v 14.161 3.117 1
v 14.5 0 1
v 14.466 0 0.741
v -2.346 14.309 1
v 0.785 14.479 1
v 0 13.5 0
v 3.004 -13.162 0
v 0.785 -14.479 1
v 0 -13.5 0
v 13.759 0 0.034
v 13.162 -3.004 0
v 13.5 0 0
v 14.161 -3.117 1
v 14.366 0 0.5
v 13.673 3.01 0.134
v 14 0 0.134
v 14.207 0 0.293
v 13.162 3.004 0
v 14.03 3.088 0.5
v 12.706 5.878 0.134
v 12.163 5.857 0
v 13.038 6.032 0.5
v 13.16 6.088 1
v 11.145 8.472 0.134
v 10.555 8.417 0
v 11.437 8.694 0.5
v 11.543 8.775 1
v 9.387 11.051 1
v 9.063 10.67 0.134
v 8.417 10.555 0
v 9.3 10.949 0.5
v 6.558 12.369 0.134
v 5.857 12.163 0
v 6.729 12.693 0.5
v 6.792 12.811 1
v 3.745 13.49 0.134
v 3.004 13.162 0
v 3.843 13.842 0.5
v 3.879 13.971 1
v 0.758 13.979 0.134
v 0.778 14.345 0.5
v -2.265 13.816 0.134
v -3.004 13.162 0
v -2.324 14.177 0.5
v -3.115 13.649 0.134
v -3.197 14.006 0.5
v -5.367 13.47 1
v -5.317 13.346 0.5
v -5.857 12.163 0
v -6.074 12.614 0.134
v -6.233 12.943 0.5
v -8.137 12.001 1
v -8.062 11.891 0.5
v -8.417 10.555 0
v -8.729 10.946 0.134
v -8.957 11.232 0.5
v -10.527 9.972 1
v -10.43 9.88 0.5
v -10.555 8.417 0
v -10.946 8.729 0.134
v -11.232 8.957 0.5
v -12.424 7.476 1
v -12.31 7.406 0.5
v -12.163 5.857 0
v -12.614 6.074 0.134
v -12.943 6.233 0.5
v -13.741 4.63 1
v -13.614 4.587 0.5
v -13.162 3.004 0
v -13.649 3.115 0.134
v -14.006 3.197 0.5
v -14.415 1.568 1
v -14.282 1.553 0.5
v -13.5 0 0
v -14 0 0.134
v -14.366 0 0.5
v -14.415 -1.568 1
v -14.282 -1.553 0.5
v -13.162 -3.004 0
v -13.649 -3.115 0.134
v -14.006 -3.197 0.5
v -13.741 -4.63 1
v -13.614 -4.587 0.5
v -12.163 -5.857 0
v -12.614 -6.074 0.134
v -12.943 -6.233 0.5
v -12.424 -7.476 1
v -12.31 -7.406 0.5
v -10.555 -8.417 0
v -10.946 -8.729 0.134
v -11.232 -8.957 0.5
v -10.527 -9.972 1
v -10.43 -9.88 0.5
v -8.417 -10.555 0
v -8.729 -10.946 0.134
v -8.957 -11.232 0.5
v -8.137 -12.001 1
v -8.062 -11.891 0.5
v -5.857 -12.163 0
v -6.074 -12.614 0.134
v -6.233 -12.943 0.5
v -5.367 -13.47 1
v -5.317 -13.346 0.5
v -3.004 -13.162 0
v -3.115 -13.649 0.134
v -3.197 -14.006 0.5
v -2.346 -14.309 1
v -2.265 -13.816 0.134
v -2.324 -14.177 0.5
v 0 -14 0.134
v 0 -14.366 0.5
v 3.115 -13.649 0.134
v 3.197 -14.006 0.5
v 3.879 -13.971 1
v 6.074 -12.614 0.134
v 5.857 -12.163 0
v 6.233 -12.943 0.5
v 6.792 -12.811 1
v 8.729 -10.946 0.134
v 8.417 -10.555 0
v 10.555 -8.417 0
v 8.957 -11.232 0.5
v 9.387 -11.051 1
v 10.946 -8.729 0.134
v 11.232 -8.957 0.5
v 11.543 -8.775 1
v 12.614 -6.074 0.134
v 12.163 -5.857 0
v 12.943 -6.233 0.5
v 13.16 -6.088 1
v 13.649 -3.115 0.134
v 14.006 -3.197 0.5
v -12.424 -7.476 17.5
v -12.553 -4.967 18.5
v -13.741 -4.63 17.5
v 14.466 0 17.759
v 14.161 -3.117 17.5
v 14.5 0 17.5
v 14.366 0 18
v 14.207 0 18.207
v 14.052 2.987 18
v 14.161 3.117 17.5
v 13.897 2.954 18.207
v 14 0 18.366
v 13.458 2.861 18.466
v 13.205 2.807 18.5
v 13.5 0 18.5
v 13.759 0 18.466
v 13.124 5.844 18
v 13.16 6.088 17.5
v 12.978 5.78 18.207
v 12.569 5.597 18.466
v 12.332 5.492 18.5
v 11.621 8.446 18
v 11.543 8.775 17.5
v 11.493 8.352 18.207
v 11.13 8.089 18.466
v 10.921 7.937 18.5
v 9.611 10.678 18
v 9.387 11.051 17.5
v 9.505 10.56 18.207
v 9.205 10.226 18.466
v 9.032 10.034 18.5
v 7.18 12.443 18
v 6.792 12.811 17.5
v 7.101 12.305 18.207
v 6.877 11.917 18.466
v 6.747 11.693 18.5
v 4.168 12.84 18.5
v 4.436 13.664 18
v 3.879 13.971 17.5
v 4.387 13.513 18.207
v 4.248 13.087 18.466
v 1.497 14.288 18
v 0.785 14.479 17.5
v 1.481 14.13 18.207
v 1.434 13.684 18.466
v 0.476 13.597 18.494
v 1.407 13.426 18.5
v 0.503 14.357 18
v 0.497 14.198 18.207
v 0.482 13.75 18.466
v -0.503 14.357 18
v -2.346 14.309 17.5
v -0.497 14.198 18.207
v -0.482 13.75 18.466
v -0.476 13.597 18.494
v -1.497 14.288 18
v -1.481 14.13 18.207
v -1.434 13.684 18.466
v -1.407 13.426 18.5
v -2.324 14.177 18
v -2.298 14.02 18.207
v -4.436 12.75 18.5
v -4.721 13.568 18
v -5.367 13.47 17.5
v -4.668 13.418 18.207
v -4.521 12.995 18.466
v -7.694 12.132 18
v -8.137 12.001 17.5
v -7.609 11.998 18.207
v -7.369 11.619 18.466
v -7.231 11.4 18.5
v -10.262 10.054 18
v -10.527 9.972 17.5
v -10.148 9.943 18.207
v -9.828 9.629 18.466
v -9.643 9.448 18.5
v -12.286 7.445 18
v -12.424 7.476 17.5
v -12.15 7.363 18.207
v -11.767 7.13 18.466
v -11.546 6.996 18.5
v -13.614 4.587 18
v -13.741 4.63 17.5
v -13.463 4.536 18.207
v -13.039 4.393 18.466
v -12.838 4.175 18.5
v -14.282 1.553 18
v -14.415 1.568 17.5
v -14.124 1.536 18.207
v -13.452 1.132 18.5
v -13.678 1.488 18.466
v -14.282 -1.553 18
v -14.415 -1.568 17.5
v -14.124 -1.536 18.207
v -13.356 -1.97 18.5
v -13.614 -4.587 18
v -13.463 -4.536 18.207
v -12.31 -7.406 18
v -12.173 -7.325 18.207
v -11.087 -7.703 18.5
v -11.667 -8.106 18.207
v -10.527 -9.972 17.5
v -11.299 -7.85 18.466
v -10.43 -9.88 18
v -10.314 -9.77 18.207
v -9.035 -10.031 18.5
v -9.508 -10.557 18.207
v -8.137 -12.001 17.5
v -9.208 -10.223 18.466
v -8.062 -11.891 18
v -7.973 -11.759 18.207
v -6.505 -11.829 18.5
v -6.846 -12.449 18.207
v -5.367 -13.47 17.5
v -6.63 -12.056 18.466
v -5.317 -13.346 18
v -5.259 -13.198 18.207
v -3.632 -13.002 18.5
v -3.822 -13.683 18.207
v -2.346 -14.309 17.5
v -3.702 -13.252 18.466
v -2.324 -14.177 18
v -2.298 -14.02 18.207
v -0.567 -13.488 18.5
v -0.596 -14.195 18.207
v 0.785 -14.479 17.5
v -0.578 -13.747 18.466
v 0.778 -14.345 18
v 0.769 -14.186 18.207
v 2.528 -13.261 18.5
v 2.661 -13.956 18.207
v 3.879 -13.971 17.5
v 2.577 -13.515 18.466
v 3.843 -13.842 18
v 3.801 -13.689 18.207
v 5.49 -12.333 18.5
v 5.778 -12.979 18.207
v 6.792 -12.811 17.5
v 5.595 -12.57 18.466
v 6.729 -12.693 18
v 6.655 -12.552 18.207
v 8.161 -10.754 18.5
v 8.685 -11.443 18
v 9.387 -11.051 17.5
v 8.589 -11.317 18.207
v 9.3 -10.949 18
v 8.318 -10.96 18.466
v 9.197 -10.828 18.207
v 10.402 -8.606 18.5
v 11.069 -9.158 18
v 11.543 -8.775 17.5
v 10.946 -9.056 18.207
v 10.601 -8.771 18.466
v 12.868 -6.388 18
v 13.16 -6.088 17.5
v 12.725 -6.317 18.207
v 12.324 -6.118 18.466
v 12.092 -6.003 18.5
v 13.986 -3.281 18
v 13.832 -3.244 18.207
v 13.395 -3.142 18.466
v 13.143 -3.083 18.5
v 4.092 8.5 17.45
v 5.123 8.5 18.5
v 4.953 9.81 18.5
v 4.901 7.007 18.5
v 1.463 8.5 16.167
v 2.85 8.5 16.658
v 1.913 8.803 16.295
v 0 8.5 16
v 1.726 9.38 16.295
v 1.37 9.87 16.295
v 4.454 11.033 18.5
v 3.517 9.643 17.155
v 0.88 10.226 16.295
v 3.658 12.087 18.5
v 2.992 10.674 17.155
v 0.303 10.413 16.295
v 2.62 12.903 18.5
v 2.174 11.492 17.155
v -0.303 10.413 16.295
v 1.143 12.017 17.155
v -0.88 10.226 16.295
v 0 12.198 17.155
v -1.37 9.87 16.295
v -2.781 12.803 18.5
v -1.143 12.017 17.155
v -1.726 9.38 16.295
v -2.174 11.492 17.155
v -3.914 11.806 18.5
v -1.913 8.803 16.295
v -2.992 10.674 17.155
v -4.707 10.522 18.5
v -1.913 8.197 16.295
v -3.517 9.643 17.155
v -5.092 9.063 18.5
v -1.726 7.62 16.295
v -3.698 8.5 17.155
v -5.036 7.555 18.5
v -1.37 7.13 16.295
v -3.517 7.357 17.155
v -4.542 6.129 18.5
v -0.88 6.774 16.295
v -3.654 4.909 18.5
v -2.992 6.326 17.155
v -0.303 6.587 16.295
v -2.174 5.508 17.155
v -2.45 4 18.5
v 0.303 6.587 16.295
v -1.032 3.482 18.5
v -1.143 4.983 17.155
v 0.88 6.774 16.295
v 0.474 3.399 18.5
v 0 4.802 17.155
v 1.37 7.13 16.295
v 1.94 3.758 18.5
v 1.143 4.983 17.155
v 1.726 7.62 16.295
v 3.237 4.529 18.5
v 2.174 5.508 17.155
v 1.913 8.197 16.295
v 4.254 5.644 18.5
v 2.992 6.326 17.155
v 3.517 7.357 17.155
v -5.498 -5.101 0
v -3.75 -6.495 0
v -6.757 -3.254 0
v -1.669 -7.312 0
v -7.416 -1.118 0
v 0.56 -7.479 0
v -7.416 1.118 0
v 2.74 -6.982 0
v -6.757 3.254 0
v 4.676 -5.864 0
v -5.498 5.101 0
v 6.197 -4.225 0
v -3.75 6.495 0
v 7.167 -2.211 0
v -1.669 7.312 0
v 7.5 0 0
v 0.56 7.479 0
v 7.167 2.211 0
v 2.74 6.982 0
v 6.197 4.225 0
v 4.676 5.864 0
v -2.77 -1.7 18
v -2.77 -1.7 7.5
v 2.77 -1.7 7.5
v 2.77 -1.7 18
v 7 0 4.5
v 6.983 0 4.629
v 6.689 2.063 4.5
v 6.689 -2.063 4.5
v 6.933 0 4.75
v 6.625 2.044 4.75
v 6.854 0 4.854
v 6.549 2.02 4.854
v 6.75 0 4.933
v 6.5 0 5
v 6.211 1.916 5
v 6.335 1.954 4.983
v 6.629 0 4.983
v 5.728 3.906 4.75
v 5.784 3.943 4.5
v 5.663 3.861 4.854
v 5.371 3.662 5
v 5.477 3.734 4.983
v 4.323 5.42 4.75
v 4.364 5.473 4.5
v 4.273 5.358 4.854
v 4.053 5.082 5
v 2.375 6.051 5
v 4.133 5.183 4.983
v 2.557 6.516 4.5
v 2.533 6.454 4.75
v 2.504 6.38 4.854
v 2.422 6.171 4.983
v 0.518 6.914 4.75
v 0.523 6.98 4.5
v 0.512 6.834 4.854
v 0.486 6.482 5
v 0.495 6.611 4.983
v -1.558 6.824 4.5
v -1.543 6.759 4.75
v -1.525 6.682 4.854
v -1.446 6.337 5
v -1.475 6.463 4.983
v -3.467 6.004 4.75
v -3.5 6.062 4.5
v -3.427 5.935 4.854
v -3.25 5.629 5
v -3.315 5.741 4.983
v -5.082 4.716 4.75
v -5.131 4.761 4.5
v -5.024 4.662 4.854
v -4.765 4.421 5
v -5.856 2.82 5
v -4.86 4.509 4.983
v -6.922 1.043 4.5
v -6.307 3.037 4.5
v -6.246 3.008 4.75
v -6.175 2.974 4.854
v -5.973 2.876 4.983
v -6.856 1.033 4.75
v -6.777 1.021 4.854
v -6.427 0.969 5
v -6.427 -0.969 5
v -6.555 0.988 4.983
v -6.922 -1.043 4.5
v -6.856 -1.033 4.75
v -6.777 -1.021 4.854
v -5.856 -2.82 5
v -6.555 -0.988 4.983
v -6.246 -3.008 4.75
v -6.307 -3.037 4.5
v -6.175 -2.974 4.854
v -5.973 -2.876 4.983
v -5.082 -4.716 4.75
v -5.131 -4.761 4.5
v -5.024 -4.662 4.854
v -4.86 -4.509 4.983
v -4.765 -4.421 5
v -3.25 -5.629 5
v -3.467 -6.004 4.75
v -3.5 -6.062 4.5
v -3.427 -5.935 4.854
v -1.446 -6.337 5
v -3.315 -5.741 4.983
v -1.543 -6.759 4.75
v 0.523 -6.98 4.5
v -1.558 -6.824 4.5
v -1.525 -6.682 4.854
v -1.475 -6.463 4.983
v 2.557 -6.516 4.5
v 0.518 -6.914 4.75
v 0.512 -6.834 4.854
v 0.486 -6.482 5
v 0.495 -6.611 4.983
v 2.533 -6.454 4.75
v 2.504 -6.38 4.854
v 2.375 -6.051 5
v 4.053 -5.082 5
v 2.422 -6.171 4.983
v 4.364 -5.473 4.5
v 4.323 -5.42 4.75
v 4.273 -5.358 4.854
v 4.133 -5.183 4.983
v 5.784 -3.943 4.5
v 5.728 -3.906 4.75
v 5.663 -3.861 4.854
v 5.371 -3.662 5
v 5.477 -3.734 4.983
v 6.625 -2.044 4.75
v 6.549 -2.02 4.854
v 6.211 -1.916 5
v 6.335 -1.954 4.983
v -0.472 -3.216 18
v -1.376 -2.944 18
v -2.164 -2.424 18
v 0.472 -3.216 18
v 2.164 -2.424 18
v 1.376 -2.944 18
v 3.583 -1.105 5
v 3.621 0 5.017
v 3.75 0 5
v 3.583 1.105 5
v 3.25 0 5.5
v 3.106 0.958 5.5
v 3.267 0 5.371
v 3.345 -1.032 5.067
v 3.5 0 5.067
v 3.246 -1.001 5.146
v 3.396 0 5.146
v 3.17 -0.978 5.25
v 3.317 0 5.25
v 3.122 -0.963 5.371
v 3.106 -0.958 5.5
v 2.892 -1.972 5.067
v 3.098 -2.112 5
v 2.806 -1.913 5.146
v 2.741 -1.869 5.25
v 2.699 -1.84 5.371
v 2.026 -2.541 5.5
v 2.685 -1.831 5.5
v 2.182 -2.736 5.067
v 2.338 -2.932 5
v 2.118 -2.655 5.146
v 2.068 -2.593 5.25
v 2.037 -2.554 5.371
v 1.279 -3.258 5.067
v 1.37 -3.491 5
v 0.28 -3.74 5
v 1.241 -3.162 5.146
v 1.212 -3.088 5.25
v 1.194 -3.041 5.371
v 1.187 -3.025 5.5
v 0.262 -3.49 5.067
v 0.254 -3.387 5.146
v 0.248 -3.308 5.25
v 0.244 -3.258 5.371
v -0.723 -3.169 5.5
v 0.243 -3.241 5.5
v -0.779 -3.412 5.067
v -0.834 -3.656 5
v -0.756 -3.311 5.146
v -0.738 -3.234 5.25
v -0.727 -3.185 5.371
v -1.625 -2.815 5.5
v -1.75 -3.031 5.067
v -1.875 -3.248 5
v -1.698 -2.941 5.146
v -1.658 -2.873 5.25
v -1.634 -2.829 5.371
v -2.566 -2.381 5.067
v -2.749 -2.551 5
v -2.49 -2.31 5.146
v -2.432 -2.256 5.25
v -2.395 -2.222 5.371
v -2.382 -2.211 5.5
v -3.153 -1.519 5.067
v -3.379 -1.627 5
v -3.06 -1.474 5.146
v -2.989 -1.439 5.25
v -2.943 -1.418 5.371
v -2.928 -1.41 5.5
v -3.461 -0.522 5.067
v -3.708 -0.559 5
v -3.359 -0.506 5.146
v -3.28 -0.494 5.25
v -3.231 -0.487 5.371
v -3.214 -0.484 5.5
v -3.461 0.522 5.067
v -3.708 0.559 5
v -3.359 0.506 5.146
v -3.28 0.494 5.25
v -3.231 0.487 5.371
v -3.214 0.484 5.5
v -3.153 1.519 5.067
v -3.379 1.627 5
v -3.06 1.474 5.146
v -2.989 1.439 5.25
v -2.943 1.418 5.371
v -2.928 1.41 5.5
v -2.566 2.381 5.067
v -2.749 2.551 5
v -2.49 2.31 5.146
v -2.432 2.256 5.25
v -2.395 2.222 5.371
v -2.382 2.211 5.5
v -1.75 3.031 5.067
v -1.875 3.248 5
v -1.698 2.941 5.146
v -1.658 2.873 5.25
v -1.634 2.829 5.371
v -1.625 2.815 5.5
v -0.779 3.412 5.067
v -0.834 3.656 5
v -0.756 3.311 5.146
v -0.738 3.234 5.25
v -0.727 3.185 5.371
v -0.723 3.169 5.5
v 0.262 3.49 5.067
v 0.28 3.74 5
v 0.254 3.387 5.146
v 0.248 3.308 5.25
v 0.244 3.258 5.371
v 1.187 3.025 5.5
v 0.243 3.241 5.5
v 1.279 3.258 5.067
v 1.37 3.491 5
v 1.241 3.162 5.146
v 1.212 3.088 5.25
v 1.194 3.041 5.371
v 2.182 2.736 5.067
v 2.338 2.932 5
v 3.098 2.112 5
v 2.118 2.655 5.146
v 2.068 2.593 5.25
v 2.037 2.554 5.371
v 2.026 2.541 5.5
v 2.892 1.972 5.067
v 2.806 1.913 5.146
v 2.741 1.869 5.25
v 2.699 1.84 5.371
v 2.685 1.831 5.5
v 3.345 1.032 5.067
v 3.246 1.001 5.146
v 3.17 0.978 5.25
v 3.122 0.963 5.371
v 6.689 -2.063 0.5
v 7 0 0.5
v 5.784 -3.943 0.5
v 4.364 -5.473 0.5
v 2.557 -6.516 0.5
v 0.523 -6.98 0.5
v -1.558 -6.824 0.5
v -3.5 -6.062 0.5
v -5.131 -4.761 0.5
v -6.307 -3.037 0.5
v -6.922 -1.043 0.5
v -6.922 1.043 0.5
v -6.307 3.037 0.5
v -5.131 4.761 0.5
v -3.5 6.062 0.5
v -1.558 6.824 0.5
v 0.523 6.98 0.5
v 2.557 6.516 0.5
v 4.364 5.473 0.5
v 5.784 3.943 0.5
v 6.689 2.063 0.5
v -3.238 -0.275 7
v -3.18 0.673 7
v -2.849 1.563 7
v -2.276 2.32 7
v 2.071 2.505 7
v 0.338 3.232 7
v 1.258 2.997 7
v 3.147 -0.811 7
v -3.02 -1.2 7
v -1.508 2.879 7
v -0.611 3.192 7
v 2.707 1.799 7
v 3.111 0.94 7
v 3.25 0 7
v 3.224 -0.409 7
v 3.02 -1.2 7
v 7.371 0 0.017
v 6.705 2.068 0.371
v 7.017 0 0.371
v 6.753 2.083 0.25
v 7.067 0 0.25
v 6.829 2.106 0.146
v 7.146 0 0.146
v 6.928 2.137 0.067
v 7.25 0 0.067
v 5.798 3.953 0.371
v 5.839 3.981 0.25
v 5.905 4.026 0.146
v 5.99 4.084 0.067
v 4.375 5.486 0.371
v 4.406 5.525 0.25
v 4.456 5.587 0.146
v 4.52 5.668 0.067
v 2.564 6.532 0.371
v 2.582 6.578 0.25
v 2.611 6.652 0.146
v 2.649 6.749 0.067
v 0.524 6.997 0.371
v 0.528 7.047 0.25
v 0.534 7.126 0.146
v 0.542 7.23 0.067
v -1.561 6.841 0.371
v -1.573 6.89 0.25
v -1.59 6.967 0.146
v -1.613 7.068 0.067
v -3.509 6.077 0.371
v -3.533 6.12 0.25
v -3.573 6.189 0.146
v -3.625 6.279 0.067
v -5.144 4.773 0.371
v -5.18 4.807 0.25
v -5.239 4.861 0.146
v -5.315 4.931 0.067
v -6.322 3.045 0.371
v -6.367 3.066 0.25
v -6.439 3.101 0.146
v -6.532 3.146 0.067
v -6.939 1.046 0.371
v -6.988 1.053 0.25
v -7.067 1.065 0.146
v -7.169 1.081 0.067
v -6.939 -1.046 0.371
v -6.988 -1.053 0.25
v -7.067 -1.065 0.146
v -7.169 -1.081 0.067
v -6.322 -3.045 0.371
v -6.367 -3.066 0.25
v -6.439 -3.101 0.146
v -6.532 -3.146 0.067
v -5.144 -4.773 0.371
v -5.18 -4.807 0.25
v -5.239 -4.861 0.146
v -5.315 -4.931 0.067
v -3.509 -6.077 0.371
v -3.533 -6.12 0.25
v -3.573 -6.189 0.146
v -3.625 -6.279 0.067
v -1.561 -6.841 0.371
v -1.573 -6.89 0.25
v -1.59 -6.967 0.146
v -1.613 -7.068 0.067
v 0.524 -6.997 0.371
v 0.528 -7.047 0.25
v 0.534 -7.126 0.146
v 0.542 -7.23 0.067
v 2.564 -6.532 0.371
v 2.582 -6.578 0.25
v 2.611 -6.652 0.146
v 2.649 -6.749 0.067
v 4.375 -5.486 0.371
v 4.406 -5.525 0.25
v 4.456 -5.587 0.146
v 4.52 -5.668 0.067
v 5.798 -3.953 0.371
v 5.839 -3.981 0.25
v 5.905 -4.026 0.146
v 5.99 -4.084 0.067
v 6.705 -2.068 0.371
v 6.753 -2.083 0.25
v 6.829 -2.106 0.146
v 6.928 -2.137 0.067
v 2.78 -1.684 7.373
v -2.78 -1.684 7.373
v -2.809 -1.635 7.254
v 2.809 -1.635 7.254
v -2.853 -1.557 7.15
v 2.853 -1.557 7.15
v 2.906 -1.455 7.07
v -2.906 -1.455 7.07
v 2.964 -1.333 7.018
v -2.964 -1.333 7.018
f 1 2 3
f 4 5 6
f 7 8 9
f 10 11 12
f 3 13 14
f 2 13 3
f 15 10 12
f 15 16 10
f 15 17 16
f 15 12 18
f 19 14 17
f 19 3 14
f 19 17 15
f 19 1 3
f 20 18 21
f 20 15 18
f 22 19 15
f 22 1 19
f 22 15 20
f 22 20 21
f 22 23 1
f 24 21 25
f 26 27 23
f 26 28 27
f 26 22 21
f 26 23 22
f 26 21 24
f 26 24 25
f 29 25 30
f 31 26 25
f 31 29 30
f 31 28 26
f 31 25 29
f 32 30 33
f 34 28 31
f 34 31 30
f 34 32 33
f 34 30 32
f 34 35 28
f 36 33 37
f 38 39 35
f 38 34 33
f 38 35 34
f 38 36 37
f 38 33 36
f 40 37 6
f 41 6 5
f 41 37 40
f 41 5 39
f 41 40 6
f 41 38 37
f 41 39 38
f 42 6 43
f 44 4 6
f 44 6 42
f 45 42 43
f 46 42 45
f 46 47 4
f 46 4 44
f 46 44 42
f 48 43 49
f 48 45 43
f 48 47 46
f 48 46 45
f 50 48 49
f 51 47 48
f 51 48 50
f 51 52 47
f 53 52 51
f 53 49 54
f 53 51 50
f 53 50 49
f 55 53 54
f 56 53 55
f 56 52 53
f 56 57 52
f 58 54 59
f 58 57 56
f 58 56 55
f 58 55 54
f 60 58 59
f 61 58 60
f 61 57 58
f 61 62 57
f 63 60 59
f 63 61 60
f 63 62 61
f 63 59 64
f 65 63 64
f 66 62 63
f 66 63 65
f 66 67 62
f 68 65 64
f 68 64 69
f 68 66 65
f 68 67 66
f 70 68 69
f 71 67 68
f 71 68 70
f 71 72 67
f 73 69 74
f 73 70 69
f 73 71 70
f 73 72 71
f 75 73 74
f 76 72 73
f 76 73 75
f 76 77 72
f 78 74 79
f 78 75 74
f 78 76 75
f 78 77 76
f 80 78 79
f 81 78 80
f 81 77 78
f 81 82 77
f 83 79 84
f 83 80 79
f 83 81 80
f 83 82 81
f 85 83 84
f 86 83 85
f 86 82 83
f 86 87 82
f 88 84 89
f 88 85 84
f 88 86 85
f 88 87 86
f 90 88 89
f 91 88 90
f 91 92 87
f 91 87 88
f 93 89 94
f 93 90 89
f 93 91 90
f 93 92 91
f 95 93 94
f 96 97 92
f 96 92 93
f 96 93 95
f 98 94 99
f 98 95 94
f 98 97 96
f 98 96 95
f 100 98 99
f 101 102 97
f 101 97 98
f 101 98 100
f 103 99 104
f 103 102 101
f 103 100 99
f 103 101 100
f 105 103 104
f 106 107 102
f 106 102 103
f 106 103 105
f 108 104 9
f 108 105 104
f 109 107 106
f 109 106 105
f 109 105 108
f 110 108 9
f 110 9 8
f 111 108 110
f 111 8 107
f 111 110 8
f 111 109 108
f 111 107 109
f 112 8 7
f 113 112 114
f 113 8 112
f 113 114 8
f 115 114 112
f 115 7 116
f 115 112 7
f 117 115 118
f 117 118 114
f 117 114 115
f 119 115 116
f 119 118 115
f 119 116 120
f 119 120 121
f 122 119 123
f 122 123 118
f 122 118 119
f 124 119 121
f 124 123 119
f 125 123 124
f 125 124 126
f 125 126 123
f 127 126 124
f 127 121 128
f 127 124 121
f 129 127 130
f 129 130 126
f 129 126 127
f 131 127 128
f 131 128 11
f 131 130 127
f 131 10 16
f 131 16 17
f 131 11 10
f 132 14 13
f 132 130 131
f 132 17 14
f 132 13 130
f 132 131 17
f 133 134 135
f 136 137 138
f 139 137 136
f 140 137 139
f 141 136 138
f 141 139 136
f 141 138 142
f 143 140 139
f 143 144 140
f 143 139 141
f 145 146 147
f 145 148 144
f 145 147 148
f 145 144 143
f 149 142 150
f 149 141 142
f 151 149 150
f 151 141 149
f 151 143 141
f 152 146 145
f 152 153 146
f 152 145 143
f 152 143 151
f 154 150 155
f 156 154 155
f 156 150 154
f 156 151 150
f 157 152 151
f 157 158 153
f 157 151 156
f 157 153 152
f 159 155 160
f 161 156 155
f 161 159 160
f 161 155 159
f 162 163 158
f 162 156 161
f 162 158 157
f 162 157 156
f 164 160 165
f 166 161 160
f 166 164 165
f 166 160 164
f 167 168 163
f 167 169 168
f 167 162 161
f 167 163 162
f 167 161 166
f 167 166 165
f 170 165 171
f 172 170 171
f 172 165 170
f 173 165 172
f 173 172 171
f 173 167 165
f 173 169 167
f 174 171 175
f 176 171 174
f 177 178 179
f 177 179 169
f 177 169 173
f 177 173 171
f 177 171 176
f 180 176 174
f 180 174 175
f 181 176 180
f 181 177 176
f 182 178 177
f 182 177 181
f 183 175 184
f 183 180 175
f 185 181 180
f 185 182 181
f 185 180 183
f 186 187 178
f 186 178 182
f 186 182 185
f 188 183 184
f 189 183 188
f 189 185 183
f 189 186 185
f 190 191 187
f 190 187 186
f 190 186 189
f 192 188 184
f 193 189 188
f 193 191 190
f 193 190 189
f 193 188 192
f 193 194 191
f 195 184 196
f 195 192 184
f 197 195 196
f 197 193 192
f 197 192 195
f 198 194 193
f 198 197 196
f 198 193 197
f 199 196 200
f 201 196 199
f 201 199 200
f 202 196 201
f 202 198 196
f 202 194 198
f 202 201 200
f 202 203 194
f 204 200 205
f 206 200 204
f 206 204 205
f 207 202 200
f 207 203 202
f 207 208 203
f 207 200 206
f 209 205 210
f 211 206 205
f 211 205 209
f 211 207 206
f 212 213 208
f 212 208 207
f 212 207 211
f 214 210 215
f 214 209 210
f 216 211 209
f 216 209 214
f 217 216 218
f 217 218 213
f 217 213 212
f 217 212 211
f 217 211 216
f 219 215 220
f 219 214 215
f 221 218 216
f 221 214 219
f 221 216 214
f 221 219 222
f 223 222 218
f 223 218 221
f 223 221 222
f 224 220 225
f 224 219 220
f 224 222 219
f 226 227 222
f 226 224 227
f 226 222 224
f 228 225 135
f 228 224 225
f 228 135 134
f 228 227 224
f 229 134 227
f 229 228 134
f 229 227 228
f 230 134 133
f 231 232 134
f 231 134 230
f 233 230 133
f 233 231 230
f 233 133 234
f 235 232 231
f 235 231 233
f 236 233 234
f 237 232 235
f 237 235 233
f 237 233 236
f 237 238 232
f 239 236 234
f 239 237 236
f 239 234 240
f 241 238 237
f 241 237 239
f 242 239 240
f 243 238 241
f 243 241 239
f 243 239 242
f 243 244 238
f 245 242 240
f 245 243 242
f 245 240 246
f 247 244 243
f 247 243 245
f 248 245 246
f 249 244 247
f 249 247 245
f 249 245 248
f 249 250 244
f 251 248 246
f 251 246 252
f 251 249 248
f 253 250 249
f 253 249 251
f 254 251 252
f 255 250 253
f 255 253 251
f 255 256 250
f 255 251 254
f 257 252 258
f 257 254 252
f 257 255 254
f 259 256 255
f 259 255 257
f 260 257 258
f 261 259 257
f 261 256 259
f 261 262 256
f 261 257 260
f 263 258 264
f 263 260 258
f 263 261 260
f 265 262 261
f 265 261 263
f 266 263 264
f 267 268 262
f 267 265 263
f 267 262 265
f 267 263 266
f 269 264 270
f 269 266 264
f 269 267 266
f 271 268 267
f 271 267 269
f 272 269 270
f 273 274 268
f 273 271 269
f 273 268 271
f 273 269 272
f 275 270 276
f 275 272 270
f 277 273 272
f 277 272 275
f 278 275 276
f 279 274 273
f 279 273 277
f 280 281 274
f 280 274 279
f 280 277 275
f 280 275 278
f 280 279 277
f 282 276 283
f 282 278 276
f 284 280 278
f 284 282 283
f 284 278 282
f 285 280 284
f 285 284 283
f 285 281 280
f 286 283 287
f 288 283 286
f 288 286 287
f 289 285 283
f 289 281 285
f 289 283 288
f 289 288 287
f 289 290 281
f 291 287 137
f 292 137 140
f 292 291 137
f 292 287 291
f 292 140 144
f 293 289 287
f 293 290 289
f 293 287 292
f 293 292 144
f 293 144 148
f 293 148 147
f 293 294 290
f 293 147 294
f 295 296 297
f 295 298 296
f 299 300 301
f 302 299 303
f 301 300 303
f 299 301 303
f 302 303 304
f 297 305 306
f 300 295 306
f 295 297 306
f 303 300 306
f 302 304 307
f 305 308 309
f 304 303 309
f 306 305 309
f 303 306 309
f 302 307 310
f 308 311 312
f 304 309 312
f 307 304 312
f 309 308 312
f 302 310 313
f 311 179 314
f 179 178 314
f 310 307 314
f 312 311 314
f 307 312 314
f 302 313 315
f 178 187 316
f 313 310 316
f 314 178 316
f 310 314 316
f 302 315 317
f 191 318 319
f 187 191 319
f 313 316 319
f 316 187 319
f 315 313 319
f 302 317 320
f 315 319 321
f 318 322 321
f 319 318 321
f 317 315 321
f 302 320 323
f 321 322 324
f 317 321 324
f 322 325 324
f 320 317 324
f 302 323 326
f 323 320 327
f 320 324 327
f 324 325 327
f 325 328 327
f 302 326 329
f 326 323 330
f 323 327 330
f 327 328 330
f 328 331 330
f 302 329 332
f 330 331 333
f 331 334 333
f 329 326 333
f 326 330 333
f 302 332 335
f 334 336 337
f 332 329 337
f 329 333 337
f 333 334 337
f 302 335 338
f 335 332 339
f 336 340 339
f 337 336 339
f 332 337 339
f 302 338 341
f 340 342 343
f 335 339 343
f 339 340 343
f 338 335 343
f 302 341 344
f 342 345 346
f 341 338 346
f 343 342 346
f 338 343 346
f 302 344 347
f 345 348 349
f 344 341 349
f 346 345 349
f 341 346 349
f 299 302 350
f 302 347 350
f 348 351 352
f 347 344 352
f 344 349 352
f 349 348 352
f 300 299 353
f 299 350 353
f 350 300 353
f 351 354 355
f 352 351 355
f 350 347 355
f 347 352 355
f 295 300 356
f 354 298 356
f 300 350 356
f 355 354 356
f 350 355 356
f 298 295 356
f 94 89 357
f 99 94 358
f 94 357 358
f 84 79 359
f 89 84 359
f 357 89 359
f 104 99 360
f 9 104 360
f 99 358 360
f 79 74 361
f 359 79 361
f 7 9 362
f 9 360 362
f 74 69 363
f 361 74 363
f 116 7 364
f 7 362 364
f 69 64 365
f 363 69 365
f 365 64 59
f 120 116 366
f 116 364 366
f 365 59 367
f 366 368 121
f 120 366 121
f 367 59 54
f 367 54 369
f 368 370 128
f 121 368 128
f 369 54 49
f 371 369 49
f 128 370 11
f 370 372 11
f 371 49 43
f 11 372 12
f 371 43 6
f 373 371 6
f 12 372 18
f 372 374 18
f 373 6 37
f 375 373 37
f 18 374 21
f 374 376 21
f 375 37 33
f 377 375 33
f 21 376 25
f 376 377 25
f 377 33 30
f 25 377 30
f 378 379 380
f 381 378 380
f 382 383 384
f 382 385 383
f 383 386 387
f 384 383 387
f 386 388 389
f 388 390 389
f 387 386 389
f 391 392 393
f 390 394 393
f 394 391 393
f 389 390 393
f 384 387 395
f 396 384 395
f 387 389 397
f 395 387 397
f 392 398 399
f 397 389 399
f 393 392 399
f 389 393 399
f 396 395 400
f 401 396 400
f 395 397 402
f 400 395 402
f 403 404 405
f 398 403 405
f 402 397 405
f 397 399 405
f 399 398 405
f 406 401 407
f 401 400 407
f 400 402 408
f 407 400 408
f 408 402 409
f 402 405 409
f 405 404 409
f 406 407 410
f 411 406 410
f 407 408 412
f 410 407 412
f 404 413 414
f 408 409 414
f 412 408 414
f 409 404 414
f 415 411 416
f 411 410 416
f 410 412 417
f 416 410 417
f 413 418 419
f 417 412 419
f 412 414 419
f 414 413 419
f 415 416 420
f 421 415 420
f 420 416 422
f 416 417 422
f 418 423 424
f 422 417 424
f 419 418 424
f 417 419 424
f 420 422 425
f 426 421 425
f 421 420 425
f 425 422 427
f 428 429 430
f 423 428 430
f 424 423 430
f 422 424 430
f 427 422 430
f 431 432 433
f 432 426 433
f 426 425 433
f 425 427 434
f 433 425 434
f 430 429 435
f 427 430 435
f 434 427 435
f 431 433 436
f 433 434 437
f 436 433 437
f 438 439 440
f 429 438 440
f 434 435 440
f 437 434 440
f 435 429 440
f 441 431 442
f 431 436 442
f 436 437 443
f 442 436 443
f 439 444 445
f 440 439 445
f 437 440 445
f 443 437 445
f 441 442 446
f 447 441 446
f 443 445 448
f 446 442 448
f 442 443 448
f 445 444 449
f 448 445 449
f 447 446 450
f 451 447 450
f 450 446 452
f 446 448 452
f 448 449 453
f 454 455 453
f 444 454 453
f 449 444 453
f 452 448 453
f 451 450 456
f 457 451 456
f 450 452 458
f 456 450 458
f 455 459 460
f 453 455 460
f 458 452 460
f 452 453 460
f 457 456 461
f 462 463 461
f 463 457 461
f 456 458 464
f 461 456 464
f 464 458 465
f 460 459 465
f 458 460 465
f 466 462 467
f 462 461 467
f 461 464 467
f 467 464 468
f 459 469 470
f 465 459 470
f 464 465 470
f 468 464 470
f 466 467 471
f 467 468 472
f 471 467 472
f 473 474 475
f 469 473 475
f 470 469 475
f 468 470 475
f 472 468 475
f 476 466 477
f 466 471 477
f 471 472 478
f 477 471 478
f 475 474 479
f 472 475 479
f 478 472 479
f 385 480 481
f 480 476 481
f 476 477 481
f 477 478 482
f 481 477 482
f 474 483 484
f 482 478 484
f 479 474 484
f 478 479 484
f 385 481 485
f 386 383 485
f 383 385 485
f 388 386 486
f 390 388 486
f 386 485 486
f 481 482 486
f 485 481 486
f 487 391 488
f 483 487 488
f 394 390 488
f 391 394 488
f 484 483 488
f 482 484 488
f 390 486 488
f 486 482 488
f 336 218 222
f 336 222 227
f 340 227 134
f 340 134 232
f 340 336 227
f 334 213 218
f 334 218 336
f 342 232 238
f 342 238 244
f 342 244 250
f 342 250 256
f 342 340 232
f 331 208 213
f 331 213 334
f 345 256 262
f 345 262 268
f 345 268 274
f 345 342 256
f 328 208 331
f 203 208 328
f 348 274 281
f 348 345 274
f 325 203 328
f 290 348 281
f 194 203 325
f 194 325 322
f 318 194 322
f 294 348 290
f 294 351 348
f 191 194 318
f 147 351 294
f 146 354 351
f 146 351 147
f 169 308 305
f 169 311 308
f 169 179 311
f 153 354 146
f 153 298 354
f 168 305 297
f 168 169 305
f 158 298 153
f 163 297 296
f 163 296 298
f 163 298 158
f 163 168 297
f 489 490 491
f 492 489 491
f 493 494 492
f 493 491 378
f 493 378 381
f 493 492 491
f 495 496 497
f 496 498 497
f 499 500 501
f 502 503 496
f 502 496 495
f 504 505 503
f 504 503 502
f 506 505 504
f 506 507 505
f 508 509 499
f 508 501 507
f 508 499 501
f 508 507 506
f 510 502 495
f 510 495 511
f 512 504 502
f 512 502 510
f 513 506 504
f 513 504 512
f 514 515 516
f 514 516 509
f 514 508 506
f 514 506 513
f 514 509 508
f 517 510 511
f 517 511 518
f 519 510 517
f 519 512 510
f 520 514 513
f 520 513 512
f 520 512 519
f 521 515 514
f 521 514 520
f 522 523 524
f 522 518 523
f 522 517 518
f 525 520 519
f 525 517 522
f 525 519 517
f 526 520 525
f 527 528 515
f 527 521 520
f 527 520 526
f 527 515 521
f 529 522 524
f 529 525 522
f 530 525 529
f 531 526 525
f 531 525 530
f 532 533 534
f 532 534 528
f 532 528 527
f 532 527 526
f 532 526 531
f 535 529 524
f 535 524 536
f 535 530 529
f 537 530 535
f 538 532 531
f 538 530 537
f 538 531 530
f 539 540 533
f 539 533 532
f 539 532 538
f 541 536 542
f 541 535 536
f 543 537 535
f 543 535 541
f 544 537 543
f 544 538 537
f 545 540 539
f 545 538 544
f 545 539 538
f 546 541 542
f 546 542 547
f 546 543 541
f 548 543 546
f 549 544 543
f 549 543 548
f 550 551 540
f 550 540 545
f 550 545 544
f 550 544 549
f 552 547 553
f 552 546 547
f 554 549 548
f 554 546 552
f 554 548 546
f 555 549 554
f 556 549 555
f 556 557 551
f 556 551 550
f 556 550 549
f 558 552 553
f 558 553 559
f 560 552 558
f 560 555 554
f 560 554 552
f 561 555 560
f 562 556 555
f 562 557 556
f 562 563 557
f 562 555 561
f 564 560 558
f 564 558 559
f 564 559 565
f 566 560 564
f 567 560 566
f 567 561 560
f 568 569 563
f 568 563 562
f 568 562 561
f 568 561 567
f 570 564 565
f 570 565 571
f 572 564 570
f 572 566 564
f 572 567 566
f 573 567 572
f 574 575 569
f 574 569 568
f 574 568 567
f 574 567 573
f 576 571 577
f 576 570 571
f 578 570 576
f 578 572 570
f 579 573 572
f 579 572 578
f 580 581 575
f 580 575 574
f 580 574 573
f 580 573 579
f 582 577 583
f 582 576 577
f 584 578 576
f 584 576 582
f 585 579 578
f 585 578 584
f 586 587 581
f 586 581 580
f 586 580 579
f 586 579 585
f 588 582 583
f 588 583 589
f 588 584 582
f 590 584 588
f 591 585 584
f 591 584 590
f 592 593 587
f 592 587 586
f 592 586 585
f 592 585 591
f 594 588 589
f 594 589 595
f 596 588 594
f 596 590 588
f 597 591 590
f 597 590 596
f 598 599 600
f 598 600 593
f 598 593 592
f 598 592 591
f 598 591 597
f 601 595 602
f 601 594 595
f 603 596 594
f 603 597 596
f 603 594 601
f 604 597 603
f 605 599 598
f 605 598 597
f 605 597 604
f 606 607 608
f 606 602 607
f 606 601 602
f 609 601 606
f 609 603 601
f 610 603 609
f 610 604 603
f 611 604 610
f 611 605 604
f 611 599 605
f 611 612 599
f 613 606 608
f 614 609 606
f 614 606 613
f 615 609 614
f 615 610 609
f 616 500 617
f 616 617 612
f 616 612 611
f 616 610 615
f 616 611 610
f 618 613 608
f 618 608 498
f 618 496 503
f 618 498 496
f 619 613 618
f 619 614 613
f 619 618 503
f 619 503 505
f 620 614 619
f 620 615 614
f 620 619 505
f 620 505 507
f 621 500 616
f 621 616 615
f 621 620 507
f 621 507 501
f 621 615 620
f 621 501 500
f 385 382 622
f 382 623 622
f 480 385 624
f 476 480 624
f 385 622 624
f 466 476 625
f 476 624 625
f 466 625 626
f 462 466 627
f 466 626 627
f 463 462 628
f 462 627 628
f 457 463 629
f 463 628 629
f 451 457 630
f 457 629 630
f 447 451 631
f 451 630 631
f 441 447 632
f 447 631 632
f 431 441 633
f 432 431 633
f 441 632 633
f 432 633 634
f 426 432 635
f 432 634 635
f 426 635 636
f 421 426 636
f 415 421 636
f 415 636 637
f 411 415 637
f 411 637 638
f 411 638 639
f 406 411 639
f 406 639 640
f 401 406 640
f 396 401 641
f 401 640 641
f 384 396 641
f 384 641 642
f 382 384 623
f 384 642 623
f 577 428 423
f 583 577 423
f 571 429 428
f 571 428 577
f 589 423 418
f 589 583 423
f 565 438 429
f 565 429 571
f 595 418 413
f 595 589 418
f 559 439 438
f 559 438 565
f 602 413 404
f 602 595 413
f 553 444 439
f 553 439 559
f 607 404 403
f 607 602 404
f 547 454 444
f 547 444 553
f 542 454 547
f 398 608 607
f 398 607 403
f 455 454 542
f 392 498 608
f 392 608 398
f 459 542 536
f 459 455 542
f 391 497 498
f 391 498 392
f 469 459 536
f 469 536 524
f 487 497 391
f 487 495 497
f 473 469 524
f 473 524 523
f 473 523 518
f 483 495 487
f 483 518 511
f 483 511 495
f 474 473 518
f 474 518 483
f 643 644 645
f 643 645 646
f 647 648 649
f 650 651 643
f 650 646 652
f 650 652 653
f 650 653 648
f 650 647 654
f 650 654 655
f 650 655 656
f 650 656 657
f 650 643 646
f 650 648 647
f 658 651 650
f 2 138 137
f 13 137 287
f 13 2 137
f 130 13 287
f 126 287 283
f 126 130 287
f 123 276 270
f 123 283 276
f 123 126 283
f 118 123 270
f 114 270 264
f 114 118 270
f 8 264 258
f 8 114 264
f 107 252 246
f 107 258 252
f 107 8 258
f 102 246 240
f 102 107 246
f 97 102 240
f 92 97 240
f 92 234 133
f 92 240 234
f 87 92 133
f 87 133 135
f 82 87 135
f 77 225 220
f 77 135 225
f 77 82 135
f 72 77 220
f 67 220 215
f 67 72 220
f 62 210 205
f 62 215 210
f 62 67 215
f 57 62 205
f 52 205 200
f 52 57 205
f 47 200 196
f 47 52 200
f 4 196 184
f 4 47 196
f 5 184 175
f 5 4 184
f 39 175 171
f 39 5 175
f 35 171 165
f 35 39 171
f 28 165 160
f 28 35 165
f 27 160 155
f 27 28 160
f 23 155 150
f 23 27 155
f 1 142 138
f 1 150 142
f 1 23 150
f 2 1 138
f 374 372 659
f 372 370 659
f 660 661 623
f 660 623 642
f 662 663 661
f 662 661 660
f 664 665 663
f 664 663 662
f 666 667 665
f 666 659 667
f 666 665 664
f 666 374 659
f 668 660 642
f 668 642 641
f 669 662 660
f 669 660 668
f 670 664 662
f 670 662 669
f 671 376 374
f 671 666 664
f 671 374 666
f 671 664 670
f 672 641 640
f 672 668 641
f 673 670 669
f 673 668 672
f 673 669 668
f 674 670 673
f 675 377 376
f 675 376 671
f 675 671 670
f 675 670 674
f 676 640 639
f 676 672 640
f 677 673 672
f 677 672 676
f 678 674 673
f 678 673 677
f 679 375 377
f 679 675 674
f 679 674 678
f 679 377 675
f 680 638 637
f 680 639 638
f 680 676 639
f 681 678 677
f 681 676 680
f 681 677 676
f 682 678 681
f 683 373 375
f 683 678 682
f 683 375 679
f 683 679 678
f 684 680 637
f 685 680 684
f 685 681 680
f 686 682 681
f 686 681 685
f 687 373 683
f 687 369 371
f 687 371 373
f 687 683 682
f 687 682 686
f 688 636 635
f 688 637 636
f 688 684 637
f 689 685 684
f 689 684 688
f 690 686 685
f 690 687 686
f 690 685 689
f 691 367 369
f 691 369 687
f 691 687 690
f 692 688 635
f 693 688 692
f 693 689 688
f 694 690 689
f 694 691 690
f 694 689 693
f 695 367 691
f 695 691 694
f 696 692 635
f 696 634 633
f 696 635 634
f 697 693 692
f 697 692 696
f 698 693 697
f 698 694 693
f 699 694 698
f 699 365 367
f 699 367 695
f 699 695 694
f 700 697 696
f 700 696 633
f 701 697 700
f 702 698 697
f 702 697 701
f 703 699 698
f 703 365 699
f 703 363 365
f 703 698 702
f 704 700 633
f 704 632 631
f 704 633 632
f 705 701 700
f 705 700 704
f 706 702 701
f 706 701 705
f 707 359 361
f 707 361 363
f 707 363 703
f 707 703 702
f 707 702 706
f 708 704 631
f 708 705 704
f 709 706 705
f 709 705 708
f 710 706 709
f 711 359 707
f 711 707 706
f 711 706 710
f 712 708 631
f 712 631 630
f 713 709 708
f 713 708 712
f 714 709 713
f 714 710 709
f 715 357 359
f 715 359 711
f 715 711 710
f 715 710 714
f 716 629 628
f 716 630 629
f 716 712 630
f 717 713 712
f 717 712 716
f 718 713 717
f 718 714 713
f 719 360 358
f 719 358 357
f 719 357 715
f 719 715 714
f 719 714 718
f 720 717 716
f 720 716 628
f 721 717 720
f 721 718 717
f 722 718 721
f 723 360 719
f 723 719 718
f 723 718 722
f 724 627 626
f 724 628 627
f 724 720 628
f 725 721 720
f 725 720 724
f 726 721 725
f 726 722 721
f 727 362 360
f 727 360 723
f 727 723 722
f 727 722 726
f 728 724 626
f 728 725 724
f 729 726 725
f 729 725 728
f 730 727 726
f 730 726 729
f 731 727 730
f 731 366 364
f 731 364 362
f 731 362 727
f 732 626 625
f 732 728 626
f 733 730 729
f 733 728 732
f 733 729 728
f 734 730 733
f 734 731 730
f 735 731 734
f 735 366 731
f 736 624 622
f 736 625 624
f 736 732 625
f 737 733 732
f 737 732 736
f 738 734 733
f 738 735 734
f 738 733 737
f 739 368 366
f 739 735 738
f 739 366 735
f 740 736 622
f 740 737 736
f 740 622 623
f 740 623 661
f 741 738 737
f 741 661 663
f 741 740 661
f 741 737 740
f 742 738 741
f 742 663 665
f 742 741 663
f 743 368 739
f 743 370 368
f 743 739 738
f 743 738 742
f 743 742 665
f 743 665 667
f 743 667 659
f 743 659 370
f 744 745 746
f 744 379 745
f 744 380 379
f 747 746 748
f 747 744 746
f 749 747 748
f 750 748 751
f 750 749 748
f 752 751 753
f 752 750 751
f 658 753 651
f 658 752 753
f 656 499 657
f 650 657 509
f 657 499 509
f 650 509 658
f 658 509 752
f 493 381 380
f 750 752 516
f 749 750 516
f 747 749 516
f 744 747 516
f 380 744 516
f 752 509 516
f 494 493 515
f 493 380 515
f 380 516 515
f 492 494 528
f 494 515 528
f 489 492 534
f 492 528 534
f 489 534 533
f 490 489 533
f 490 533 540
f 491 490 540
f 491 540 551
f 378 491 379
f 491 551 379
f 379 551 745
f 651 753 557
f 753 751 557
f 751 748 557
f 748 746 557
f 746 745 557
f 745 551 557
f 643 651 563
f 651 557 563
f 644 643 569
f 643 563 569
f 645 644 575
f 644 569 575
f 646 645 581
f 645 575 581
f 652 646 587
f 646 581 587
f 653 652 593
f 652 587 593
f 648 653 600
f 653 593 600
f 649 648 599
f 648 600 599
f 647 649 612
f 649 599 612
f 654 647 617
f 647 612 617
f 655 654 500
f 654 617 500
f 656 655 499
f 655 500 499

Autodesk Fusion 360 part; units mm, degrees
sketch "Sketch1" plane through (0, 0, 0) normal (0, 0, 1) x (1, 0, 0)
  circle A0 centre (0, 0) radius 14.5
  dimension "d1" = 29
extrude "Extrude1" add sketch "Sketch1" along normal blind 18.5
sketch "Sketch2" plane through (0, 0, 0) normal (0, 0, -1) x (1, 0, 0)
  circle A0 centre (0, 0) radius 14.5
  circle A1 centre (0, 0) radius 7
  circle A2 centre (0, 0) radius 3.25
  line L0 (-2.7699, 1.7) -> (2.7699, 1.7)
  dimension "d4" = 14
  dimension "d5" = 1.7
  dimension "d6" = 6.5
extrude "Extrude2" cut sketch "Sketch2" against normal blind 18 contours A2 L0 picked at (-0.7983, 2.2791)
extrude "Extrude3" cut sketch "Sketch2" against normal blind 7 contours A2 L0 picked at (-0.7022, 0.2404)
extrude "Extrude4" cut sketch "Sketch2" against normal blind 5 contours A1
fillet "Fillet1" radius 0.5 1 edges at (0, -1.7, 7)
fillet "Fillet1" radius 0.5 1 edges at (-3.0301, 1.1753, 5)
fillet "Fillet1" radius 0.5 1 edges at (-6.5263, -2.5313, 5)
fillet "Fillet2" radius 0.5 1 edges at (-6.5263, -2.5313, 0)
fillet "Fillet3" radius 1 2 edges at (-13.5187, -5.2434, 0) (-13.5187, -5.2434, 18.5)
ref_plane "WorkPlane1" through (0, 0, 22.5) normal (0, 0, 1) x (1, 0, 0)
sketch "Sketch4" plane through (0, 0, 22.5) normal (0, 0, 1) x (1, 0, 0)
  line L0 (0, 0) -> (0, 14) construction
  line L1 (-3.75, 8.5) -> (3.75, 8.5) construction
  point P0 (0, 8.5)
  dimension "d24" = 8.5
sphere "SpherePrimitive3" cut diameter 13 placed x (1, 0, 0) y (0, 1, 0) z (0, 0, 1) at (0, 8.5, 22.5)
